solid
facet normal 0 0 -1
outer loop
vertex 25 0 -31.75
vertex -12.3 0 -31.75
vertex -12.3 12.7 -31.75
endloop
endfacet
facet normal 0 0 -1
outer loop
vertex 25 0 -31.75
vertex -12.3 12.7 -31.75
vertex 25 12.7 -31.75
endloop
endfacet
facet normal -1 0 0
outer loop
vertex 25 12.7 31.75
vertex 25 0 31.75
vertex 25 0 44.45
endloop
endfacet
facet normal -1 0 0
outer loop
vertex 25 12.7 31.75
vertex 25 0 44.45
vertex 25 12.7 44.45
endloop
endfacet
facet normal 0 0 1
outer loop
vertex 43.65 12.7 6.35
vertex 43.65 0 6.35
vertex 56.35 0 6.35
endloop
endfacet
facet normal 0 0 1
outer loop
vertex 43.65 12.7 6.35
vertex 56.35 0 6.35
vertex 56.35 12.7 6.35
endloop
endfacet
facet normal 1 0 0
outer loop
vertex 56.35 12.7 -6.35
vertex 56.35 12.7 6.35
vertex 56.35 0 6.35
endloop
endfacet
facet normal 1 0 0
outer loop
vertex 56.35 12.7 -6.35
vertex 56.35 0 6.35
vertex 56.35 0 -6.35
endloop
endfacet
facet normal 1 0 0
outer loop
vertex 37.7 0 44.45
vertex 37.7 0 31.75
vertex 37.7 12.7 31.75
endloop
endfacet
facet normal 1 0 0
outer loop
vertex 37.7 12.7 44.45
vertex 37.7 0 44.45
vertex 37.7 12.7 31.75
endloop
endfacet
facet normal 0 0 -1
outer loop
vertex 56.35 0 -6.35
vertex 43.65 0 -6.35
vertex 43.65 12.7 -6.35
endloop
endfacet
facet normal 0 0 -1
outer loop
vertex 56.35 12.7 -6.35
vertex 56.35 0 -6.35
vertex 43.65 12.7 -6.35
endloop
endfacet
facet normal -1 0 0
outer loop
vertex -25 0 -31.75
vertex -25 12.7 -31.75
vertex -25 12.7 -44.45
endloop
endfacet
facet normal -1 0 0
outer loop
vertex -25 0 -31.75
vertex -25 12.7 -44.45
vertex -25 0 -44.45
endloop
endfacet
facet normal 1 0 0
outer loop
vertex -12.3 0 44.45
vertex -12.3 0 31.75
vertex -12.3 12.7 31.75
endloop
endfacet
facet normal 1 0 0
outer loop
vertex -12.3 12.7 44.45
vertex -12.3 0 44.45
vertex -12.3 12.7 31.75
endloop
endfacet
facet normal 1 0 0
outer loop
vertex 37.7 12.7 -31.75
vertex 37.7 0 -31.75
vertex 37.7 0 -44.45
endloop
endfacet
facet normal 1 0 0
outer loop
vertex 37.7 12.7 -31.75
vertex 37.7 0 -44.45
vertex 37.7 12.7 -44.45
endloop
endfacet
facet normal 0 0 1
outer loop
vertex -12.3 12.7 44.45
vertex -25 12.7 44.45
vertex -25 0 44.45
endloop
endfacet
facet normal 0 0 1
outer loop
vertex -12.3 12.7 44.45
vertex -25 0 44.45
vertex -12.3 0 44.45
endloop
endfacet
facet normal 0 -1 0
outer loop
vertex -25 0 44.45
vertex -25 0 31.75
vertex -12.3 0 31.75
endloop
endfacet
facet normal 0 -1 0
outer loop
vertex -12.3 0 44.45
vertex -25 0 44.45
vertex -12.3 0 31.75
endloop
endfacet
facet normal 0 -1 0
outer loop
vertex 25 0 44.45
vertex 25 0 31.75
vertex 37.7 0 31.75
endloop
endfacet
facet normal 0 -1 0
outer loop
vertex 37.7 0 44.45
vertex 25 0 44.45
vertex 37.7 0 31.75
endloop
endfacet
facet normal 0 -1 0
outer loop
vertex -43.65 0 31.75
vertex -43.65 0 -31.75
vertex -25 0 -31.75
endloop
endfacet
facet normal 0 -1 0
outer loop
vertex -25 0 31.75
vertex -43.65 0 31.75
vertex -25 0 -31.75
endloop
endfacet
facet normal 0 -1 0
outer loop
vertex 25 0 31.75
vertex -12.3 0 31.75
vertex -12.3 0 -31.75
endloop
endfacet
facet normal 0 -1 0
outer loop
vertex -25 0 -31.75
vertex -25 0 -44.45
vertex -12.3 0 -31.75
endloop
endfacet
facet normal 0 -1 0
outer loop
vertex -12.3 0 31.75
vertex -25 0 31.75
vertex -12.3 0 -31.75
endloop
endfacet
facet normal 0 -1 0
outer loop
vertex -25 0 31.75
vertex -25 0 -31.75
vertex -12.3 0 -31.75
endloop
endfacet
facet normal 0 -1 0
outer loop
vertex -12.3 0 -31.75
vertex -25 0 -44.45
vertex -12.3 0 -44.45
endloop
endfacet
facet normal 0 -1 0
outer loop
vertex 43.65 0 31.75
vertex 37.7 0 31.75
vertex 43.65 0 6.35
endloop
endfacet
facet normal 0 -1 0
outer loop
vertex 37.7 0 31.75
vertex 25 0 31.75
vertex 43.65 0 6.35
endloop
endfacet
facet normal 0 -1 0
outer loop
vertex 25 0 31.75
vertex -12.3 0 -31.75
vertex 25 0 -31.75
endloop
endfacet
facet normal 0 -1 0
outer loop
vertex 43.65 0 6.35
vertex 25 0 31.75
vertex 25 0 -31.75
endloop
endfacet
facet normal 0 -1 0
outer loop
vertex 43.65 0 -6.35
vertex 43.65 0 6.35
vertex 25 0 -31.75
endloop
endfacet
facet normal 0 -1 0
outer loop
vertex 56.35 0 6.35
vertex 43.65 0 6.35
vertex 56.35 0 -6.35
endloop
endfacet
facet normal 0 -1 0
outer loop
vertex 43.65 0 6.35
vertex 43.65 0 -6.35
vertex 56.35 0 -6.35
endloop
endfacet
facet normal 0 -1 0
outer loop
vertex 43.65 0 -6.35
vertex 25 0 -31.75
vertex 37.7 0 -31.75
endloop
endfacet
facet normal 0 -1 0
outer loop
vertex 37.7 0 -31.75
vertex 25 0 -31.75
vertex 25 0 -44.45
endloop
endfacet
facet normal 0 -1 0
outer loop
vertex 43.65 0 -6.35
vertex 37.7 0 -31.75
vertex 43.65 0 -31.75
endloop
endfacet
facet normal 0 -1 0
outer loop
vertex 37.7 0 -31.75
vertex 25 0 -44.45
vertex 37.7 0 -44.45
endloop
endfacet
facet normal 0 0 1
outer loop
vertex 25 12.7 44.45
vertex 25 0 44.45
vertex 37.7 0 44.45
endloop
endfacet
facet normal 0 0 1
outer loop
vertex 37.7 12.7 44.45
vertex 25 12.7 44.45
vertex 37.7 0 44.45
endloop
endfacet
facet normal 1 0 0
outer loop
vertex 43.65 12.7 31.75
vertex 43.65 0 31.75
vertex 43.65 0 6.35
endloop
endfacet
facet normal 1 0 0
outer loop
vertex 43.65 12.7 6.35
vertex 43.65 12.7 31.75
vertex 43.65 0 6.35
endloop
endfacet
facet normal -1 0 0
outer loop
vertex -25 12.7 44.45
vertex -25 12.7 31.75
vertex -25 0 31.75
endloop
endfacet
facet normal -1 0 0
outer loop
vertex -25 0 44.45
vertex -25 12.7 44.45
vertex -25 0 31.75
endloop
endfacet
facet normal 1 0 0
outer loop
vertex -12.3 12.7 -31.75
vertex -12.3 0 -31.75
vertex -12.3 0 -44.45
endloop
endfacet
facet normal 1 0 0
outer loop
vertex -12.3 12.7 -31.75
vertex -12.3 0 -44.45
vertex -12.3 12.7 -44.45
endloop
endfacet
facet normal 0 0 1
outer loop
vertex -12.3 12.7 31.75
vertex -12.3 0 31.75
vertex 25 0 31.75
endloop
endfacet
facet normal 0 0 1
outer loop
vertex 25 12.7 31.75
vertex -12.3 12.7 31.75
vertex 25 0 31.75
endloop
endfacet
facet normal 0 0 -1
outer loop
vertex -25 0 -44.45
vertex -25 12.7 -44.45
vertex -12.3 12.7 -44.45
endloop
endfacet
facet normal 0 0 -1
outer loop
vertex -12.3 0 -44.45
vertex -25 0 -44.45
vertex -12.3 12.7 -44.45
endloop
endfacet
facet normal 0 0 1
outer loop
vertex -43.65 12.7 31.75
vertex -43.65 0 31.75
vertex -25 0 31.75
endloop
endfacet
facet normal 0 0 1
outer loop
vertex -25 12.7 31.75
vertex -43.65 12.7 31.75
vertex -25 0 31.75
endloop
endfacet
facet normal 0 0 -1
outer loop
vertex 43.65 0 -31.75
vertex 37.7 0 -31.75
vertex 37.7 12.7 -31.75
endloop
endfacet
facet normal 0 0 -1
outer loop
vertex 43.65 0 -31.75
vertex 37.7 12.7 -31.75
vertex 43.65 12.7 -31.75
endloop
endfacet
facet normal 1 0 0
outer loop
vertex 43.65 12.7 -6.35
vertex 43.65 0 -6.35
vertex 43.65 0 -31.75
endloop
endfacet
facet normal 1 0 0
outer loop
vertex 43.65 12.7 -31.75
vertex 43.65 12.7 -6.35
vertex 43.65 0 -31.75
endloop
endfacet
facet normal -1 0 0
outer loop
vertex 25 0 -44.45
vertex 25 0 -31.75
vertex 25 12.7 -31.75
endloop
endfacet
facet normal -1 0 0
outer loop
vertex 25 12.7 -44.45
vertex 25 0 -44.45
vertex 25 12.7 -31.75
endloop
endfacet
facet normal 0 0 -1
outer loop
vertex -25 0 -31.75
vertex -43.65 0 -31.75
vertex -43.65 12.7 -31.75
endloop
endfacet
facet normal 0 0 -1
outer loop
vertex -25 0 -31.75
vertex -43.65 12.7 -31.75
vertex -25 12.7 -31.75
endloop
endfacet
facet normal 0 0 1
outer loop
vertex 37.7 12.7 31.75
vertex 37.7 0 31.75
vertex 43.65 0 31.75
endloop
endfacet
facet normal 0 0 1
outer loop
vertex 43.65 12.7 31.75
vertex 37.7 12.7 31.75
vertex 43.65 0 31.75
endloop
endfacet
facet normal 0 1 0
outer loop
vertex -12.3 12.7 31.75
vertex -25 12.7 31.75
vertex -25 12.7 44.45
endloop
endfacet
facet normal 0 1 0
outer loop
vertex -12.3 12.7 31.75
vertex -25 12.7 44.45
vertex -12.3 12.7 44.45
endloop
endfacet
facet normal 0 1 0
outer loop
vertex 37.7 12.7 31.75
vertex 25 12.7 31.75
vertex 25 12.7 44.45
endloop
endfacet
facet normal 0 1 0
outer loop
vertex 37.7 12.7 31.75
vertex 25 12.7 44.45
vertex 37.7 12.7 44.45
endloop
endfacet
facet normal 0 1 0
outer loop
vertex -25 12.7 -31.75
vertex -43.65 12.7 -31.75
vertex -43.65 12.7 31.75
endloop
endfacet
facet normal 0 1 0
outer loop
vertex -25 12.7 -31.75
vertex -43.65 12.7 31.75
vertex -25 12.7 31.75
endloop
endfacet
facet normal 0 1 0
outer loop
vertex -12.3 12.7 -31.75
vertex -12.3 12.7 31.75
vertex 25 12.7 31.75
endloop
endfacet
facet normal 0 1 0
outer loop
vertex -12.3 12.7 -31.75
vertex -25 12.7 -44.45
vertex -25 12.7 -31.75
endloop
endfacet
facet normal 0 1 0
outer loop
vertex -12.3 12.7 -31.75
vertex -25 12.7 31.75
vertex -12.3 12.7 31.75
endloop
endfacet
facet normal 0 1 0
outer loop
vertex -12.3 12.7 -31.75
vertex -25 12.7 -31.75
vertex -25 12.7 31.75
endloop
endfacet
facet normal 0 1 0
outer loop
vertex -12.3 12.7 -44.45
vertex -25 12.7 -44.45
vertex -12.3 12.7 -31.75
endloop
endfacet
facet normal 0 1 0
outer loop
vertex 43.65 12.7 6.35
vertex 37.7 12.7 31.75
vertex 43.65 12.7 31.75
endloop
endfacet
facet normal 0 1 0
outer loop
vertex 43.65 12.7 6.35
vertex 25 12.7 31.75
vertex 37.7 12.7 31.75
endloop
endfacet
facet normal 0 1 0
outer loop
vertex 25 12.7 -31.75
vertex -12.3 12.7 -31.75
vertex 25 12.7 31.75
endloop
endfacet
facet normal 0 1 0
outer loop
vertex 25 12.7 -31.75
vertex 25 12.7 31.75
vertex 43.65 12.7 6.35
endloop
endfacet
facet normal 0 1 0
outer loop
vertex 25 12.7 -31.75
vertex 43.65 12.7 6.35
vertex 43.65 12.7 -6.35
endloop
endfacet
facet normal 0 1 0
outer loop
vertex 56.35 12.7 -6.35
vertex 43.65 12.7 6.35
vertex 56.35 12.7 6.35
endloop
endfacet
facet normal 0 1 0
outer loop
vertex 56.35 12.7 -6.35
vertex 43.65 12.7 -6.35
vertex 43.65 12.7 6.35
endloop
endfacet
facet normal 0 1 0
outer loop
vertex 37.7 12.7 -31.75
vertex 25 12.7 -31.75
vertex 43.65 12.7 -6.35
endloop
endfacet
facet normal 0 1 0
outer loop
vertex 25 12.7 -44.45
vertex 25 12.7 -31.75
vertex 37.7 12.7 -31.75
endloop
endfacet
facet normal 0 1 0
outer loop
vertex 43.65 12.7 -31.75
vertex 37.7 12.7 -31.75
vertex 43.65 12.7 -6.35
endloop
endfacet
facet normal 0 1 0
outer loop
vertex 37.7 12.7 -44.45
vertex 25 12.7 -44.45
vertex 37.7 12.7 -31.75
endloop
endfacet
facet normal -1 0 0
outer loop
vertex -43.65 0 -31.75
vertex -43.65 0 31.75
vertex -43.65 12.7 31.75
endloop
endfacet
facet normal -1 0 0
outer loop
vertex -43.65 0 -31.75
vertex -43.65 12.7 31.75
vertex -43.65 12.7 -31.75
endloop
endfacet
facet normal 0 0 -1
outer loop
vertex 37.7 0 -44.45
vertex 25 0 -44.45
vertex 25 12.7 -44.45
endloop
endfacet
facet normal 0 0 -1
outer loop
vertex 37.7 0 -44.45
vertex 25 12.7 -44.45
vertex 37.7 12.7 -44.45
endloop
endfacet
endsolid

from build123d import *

# Parameters (mm, degrees)
SKETCH3_W           = 87.3
SKETCH3_H           = 63.5
BOSS_EXTRUDE3_DEPTH = 12.7
SKETCH4_W           = 12.7
SKETCH4_H           = 12.7
BOSS_EXTRUDE4_DEPTH = 12.7
SKETCH5_W           = 12.7
SKETCH5_H           = 12.7
BOSS_EXTRUDE7_DEPTH = 12.7


with BuildPart() as part:
    # Sketch3 → Boss-Extrude3 (new body)
    with BuildSketch(Plane(origin=(0, 0, 0), x_dir=(1, 0, 0), z_dir=(0, 1, 0))):
        Rectangle(SKETCH3_W, SKETCH3_H)
    extrude(amount=BOSS_EXTRUDE3_DEPTH)

    # Sketch4 → Boss-Extrude4 (add)
    with BuildSketch(Plane(origin=(43.65, 0, 0), x_dir=(0, 0, -1), z_dir=(1, 0, 0))):
        with Locations((0, 6.35)):
            Rectangle(SKETCH4_W, SKETCH4_H)
    extrude(amount=BOSS_EXTRUDE4_DEPTH)

    # Sketch5 → Boss-Extrude7 (add)
    with BuildSketch(Plane.XY.offset(31.75)):
        Polygon((-12.300000038, 12.7), (-25.000000038, 12.7), (-25.000000038, 6.35), (-25.000000038, 0), (-12.300000038, 0), align=None)
        with Locations((31.349999962, 6.35)):
            Rectangle(SKETCH5_W, SKETCH5_H)
    boss_extrude7 = extrude(amount=BOSS_EXTRUDE7_DEPTH)

    # Mirror2: Boss-Extrude7 across plane
    add(boss_extrude7.mirror(Plane.XY))


solid = part.part
